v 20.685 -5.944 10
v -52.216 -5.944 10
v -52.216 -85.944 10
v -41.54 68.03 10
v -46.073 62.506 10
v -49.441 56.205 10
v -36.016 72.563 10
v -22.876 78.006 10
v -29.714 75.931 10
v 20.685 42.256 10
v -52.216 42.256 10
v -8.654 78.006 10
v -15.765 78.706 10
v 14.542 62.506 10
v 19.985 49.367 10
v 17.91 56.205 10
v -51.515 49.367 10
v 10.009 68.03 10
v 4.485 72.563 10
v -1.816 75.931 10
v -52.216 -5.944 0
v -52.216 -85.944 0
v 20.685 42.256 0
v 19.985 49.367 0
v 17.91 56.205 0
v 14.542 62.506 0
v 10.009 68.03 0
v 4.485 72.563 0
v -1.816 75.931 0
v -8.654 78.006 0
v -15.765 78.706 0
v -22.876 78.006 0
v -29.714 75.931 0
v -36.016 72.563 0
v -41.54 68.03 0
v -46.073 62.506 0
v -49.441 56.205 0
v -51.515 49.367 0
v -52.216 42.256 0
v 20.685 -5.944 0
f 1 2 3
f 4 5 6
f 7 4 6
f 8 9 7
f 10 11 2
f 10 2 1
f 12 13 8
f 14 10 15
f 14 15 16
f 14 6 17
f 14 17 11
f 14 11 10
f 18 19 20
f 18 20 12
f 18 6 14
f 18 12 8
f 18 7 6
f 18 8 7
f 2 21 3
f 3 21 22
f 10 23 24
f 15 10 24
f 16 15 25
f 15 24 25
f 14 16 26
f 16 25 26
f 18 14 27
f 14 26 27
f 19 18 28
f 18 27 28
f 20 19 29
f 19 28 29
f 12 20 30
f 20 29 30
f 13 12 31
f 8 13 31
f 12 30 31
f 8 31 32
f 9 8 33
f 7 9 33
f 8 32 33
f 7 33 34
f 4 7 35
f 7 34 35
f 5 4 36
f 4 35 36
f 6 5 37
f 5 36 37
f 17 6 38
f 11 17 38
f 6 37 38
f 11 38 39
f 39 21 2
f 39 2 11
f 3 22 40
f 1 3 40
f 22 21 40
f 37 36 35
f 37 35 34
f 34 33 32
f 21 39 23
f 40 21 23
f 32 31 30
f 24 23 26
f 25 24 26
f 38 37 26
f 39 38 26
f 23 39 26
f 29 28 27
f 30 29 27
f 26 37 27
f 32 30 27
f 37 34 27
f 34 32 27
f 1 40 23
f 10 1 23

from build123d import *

# Parameters (mm, degrees)
F0_W     = 72.900745
F0_H     = 48.2
F1_DEPTH = 10


with BuildPart() as f1:
    # F0 (on Top) → F1 (new body)
    with BuildSketch(Plane.XY):
        with BuildLine():
            ThreePointArc((20.685012, 42.255733), (-15.765361, 78.706105), (-52.215733, 42.255733))
            Line((-52.215733, 42.255733), (20.685012, 42.255733))
        make_face()
        with Locations((-15.76536, 18.155733)):
            Rectangle(F0_W, F0_H)
        Polygon((20.685012, -5.944267), (-52.215733, -5.944267), (-52.215733, -85.944267), align=None)
    extrude(amount=F1_DEPTH)


solid = f1.part
